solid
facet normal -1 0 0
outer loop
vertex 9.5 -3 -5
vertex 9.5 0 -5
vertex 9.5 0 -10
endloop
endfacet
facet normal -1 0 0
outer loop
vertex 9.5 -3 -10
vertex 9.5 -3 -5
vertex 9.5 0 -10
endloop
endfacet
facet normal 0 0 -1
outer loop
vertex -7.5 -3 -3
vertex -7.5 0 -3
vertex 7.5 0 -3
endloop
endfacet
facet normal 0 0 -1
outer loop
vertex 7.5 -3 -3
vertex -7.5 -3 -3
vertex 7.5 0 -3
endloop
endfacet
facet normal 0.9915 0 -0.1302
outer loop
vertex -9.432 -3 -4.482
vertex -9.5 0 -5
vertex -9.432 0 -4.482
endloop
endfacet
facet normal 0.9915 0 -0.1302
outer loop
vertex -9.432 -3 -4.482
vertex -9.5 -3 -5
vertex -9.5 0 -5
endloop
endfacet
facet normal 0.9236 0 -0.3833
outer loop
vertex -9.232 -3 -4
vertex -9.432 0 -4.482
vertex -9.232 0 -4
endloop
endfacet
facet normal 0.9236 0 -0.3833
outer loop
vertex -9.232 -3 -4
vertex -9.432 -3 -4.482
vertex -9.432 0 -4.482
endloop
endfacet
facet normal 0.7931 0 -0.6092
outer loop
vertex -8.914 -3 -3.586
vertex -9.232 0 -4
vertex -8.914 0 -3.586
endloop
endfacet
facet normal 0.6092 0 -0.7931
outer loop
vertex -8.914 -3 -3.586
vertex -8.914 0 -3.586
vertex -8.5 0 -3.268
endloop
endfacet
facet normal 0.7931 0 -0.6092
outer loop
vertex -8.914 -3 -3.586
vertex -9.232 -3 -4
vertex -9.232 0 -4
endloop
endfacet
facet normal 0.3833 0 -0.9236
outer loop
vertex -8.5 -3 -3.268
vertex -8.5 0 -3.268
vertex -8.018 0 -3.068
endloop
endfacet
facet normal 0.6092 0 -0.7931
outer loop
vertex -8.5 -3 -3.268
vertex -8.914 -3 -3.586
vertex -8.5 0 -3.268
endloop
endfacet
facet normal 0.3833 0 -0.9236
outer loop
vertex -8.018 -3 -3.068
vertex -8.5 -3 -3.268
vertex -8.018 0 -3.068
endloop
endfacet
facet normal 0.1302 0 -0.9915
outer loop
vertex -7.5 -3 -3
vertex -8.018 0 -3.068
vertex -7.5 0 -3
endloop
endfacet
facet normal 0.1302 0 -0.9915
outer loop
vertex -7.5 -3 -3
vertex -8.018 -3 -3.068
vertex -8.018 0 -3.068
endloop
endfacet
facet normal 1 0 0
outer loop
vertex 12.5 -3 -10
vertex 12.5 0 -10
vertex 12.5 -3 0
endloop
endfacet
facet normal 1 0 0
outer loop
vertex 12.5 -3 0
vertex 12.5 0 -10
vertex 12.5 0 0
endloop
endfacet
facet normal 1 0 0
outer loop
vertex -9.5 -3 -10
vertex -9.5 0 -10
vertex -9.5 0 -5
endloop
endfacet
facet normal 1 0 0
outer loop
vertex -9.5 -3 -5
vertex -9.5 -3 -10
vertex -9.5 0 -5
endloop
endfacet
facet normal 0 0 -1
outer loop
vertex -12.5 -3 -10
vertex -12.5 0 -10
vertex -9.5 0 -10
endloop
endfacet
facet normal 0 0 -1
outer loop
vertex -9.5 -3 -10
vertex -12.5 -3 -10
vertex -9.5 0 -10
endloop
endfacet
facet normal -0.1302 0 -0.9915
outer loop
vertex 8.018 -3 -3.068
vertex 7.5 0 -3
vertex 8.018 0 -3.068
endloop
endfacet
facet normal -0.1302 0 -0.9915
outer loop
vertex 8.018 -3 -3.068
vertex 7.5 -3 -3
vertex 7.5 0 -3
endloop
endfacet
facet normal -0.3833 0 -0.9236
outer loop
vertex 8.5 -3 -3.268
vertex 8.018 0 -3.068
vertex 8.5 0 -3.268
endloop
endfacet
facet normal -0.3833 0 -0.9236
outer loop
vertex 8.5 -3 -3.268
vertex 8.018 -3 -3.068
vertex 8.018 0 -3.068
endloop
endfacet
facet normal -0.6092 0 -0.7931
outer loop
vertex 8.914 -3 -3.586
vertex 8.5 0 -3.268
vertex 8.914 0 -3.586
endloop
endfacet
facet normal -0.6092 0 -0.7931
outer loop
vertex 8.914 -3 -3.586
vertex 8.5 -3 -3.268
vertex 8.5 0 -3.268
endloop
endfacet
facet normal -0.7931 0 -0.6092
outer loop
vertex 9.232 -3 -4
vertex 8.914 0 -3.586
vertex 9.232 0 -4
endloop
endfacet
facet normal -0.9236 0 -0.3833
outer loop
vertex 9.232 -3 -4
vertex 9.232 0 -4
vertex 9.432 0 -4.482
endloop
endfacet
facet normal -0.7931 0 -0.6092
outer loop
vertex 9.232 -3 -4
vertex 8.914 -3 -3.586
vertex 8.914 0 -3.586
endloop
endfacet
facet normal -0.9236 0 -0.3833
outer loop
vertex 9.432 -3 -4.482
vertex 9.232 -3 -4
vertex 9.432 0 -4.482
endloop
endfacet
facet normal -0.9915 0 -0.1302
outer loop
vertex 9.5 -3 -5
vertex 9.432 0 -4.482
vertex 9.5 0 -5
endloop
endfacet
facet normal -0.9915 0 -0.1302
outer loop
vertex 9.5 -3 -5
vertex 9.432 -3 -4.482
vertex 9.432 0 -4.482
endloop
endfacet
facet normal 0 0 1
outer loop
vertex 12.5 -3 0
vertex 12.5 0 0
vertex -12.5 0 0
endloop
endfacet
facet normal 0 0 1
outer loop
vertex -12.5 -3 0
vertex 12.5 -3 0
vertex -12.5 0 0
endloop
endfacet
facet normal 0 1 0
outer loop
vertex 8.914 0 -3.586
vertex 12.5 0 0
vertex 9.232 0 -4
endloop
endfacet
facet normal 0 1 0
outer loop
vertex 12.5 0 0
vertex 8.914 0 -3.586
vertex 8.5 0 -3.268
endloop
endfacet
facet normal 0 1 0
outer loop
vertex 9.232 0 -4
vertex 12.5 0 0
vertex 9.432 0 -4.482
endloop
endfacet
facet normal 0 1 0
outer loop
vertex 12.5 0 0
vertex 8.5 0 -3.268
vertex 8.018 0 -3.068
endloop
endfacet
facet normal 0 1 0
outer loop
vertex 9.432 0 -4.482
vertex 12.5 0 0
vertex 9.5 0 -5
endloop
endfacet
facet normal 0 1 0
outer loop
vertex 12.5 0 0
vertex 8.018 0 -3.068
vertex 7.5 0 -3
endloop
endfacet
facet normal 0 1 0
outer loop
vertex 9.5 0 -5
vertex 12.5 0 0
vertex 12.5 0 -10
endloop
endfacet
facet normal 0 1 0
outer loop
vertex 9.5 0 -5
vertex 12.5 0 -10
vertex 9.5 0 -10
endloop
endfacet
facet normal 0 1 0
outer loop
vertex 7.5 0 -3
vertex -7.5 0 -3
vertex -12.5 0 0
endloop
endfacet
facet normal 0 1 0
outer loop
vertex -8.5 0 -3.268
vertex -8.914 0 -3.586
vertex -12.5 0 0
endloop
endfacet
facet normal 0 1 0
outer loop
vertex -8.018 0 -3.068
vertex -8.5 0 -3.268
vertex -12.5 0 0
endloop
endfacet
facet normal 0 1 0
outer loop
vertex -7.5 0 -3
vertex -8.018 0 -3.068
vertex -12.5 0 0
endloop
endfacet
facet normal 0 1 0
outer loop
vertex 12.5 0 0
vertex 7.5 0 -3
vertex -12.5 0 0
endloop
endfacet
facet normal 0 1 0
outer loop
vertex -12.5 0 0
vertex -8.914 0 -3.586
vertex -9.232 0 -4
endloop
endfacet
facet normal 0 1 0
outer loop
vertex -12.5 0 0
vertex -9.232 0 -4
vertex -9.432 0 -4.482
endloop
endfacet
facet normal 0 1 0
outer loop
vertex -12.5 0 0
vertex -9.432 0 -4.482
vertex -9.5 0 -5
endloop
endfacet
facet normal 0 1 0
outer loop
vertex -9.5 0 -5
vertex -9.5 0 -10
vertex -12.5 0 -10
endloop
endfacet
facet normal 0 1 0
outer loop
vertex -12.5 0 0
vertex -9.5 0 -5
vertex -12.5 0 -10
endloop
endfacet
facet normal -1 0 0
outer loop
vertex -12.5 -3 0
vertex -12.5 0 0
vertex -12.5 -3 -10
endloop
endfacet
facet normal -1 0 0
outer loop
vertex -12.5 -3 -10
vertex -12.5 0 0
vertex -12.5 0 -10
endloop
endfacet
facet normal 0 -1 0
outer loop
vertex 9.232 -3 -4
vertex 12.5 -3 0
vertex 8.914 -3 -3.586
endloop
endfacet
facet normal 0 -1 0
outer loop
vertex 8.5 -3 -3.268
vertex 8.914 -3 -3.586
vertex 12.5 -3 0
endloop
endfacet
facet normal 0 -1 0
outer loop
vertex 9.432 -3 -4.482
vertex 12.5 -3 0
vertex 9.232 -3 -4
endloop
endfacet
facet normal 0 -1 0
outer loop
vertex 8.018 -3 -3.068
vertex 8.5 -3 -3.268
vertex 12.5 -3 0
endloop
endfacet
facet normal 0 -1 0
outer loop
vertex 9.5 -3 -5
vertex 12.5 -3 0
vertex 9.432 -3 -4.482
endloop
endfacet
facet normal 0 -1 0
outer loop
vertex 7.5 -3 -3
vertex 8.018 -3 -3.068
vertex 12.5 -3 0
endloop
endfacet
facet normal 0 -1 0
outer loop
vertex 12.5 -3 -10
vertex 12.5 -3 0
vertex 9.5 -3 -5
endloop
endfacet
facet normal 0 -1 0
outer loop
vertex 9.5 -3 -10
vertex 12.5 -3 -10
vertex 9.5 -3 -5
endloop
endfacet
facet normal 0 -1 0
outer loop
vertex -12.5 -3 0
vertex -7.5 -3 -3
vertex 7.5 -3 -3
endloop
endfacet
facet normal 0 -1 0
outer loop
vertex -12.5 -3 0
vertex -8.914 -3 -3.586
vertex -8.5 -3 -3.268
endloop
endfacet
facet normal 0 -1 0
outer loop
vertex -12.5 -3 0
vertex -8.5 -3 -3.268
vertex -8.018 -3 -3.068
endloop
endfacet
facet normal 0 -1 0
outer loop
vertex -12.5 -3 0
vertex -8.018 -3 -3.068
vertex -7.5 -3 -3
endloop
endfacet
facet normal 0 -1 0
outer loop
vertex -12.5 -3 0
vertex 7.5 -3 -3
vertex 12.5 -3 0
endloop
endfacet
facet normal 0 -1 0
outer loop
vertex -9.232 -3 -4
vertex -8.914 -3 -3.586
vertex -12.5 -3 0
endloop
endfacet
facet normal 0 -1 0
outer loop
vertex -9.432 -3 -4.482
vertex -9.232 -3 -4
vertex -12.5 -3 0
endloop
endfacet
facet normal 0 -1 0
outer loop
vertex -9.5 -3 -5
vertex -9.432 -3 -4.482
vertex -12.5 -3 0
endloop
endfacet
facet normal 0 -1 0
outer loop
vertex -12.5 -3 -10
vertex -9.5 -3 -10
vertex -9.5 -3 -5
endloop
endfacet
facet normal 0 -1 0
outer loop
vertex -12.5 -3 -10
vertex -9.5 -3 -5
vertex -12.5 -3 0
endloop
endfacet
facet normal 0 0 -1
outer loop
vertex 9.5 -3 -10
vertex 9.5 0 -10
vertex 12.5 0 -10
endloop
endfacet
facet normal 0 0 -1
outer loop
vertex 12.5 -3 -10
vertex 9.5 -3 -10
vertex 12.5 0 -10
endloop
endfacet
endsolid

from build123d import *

# Parameters (mm, degrees)
SALIENTE_EXTRUIR1_DEPTH = 3
REDONDEO4_R             = 2
REDONDEO5_R             = 2


with BuildPart() as part:
    # Croquis1 → Saliente-Extruir1 (new body)
    with BuildSketch(Plane(origin=(0, 0, 0), x_dir=(1, 0, 0), z_dir=(0, 1, 0))):
        Polygon((12.5, 0), (-12.5, 0), (-12.5, 10), (-9.5, 10), (-9.5, 3), (9.5, 3), (9.5, 10), (12.5, 10), align=None)
    extrude(amount=-SALIENTE_EXTRUIR1_DEPTH)

    # Redondeo4
    redondeo4_edges = [part.edges().sort_by_distance(p)[0] for p in [
        (-9.5, -1.5, -3),
    ]]
    fillet(redondeo4_edges, radius=REDONDEO4_R)

    # Redondeo5
    redondeo5_edges = [part.edges().sort_by_distance(p)[0] for p in [
        (9.5, -1.5, -3),
    ]]
    fillet(redondeo5_edges, radius=REDONDEO5_R)


solid = part.part
